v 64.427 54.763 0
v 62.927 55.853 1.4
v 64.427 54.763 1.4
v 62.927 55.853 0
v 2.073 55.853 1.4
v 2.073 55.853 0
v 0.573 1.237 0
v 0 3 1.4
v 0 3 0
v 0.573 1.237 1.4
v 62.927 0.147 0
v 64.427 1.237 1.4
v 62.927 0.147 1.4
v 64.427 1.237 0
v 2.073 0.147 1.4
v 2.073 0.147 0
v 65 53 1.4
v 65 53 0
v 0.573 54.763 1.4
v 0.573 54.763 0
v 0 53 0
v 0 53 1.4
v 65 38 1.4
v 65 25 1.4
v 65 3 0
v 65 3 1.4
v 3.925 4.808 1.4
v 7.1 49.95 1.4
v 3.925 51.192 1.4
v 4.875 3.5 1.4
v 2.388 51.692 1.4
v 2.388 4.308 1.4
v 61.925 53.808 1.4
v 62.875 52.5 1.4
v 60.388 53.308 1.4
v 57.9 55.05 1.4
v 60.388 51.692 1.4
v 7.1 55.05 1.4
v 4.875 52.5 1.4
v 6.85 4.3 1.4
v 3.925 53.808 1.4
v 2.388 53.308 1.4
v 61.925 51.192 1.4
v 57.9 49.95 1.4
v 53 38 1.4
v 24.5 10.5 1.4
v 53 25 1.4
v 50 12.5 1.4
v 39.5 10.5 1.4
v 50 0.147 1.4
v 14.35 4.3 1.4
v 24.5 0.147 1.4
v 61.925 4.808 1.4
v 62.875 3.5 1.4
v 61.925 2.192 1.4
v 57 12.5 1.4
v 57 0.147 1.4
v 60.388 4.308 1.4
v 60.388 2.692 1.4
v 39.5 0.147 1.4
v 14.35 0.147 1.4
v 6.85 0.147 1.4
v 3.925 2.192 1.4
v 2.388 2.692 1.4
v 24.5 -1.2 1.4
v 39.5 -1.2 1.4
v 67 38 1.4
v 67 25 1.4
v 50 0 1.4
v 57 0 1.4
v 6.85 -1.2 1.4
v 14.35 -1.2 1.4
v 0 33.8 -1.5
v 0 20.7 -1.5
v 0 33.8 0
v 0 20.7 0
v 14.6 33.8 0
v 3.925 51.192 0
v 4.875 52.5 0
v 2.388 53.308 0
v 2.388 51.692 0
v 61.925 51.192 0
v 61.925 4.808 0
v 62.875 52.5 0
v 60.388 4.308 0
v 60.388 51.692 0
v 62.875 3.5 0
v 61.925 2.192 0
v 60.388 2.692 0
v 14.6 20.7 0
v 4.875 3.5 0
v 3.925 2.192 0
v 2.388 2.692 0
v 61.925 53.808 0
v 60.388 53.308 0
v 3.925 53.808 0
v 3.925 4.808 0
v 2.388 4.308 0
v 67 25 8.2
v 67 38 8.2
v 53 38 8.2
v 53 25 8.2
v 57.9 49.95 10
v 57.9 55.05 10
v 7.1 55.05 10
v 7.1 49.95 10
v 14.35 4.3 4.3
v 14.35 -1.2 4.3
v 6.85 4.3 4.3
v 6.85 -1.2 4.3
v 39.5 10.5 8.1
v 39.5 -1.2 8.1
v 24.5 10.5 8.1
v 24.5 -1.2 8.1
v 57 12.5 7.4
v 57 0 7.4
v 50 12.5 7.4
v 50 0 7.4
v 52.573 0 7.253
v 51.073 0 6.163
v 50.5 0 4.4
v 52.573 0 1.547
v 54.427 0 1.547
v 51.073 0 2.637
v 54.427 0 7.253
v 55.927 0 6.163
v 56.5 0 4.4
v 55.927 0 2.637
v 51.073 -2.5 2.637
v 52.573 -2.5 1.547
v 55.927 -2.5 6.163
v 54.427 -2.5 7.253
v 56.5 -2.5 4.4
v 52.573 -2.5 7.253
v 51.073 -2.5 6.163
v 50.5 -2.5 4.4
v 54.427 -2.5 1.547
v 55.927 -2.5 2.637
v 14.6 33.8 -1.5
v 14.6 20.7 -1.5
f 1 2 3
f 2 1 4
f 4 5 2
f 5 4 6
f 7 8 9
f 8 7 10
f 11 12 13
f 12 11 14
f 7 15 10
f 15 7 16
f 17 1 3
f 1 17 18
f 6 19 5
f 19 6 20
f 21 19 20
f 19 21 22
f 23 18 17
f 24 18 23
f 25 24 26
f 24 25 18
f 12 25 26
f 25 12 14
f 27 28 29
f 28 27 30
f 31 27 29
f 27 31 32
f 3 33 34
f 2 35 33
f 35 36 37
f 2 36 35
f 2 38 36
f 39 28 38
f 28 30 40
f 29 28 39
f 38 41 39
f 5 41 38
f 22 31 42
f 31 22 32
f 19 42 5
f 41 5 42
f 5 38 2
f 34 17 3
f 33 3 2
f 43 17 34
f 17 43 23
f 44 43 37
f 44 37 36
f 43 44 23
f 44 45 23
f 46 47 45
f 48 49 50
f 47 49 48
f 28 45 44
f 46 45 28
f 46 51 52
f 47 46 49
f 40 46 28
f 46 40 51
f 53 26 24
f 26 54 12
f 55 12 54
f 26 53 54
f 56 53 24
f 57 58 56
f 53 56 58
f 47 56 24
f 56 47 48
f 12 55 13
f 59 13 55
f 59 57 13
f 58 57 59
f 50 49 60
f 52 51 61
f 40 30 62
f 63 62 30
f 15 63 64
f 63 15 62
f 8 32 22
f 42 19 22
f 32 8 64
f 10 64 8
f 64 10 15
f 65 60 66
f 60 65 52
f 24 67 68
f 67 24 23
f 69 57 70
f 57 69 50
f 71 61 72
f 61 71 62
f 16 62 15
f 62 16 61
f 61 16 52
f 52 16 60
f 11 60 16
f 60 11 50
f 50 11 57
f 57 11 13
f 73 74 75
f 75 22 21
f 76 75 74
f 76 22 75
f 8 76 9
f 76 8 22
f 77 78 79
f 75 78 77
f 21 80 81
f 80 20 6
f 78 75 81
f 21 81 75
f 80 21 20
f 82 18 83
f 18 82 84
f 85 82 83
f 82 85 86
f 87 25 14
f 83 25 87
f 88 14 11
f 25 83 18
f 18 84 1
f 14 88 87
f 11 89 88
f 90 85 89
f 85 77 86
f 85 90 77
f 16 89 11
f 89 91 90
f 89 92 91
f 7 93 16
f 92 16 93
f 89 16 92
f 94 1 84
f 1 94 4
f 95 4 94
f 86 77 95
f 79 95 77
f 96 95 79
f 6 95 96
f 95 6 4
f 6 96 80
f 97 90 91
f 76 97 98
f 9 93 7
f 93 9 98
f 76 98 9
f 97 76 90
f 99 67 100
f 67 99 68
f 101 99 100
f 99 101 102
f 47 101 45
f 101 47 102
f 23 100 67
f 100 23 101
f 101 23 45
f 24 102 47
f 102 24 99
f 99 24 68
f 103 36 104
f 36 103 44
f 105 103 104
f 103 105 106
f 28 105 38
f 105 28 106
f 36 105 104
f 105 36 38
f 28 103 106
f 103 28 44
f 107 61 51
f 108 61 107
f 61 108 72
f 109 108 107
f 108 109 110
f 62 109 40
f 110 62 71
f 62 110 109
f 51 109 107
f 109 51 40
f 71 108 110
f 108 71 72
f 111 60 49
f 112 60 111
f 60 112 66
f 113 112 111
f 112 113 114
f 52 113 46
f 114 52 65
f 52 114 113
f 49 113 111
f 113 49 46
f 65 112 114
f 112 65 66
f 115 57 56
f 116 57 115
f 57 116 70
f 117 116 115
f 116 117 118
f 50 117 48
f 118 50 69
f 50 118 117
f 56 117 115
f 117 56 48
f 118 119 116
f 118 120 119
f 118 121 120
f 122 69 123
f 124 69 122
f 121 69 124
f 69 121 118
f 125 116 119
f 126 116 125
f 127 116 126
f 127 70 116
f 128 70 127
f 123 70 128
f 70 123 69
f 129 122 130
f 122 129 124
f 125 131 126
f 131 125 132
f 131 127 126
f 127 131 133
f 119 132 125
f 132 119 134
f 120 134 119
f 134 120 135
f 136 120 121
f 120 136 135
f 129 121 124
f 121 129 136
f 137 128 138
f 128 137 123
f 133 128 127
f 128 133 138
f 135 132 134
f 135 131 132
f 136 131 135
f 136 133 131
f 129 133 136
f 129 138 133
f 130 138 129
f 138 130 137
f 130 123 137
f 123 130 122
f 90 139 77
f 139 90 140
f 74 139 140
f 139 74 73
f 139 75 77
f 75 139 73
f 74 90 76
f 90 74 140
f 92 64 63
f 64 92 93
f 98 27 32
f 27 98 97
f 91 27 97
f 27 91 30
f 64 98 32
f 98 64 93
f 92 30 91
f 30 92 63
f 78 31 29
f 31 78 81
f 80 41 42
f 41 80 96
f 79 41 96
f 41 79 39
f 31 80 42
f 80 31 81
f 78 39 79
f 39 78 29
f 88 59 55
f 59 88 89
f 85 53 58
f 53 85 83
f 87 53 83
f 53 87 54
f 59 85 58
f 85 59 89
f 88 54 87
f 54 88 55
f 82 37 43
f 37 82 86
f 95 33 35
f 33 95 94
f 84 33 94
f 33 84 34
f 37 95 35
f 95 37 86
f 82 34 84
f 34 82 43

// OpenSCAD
// file: roundedcube.scad
module roundedcube(lx, ly, lz, radius) {
translate([radius, radius, radius])
minkowski() {
cube([lx-2*radius, ly-2*radius, lz-2*radius]);
sphere(r=radius);
}
}


module roundedcubexy(lx,ly,lz,radius) {
translate([radius, radius, 0])
minkowski() {
cube([lx-2*radius,ly-2*radius,lz/2]);
cylinder(r=radius, h=lz/2);
}
}

module roundedcubexz(lx,ly,lz,radius) {
translate([radius, 0, radius])
minkowski() {
cube([lx-2*radius, ly/2, lz-2*radius]);
rotate([-90, 0, 0])
	cylinder(r=radius, h=ly/2);
}
}

module roundedcubeyz(lx,ly,lz,radius) {
translate([0, radius, radius])
minkowski() {
cube([lx/2, ly-2*radius, lz-2*radius]);
rotate([0, 90, 0])
	cylinder(r=radius, h=lx/2);
}
}

roundedcubeyz(30, 20, 10, 3);
// main file
use <roundedcube.scad>

module RaspberryPiA()
{
cube([85,56,1.6]);
translate([-0.5, 3.6, 1.6])
	cube([5.6, 7.6, 2.4]);
translate([-12, 3.6+7.6/2-11/2, 1.6+2.4/2-7/2])
	cube([12, 11, 7]);
}



module RaspberryPiAplus()
{
difference()
{
union()
{
// pcb
roundedcubexy(65, 56, 1.4, 3);

// usb connector
translate([65-12, 25, 1.4])
	cube([14, 13, 8.2-1.4]);

// expansion header
translate([3.5+29-50.8/2, 3.5+49-5.1/2, 1.4])
	cube([50.8, 5.1, 8.6]);

// power micro usb
translate([10.6-7.5/2, -1.2, 1.4])
	cube([7.5, 5.5, 2.9]);

// hdmi
translate([32-15/2, -1.2, 1.4])
	cube([15, 11.7, 6.7]);

// audio
translate([53.5-7/2, 0, 1.4])
	cube([7, 12.5, 6]);
translate([53.5, 0, 1.4+6/2])
	rotate([90, 0, 0])
	cylinder(d=6, h=2.5);

// micro sd 
translate([0, 20.7, -1.5])
	cube([14.6, 13.1, 1.5]);
}
// pcb mounting holes
translate([3.5, 3.5, -0.01])
	cylinder(r=2.75/2, h=2);
translate([3.5, 3.5+49, -0.01])
	cylinder(r=2.75/2, h=2);
translate([3.5+58, 3.5, -0.01])
	cylinder(r=2.75/2, h=2);
translate([3.5+58, 3.5+49, -0.01])
	cylinder(r=2.75/2, h=2);
}
}


// data from RPI-BPLUS-V1_2-MECHDRAWING
module RaspberryPiBplus()
{
difference()
{
union()
{
// pcb
roundedcubexy(85, 56, 1.4, 3);

// ethernet jack
translate([85-21.3+2, 10.25-16/2, 1.4])
	cube([21.3, 16, 13.6]);

// usb left
translate([85-17+2, 29-13.2/2, 1.4])
	cube([17, 13.2, 15.4]);

// usb right 
translate([85-17+2, 47-13.2/2, 1.4])
	cube([17, 13.2, 15.4]);

// expansion header
translate([3.5+29-50.8/2, 3.5+49-5.1/2, 1.4])
	cube([50.8, 5.1, 8.6]);

// power micro usb
translate([10.6-7.5/2, -1.2, 1.4])
	cube([7.5, 5.5, 2.9]);

// hdmi
translate([32-15/2, -1.2, 1.4])
	cube([15, 11.7, 6.7]);

// audio
translate([53.5-7/2, 0, 1.4])
	cube([7, 12.5, 6]);
translate([53.5, 0, 1.4+6/2])
	rotate([90, 0, 0])
	cylinder(d=6, h=2.5);

// micro sd 
translate([0, 20.7, -1.5])
	cube([14.6, 13.1, 1.5]);
}
// pcb mounting holes
translate([3.5, 3.5, -0.01])
	cylinder(r=2.75/2, h=2);
translate([3.5, 3.5+49, -0.01])
	cylinder(r=2.75/2, h=2);
translate([3.5+58, 3.5, -0.01])
	cylinder(r=2.75/2, h=2);
translate([3.5+58, 3.5+49, -0.01])
	cylinder(r=2.75/2, h=2);
}
}

//$fn=18;
RaspberryPiAplus();
